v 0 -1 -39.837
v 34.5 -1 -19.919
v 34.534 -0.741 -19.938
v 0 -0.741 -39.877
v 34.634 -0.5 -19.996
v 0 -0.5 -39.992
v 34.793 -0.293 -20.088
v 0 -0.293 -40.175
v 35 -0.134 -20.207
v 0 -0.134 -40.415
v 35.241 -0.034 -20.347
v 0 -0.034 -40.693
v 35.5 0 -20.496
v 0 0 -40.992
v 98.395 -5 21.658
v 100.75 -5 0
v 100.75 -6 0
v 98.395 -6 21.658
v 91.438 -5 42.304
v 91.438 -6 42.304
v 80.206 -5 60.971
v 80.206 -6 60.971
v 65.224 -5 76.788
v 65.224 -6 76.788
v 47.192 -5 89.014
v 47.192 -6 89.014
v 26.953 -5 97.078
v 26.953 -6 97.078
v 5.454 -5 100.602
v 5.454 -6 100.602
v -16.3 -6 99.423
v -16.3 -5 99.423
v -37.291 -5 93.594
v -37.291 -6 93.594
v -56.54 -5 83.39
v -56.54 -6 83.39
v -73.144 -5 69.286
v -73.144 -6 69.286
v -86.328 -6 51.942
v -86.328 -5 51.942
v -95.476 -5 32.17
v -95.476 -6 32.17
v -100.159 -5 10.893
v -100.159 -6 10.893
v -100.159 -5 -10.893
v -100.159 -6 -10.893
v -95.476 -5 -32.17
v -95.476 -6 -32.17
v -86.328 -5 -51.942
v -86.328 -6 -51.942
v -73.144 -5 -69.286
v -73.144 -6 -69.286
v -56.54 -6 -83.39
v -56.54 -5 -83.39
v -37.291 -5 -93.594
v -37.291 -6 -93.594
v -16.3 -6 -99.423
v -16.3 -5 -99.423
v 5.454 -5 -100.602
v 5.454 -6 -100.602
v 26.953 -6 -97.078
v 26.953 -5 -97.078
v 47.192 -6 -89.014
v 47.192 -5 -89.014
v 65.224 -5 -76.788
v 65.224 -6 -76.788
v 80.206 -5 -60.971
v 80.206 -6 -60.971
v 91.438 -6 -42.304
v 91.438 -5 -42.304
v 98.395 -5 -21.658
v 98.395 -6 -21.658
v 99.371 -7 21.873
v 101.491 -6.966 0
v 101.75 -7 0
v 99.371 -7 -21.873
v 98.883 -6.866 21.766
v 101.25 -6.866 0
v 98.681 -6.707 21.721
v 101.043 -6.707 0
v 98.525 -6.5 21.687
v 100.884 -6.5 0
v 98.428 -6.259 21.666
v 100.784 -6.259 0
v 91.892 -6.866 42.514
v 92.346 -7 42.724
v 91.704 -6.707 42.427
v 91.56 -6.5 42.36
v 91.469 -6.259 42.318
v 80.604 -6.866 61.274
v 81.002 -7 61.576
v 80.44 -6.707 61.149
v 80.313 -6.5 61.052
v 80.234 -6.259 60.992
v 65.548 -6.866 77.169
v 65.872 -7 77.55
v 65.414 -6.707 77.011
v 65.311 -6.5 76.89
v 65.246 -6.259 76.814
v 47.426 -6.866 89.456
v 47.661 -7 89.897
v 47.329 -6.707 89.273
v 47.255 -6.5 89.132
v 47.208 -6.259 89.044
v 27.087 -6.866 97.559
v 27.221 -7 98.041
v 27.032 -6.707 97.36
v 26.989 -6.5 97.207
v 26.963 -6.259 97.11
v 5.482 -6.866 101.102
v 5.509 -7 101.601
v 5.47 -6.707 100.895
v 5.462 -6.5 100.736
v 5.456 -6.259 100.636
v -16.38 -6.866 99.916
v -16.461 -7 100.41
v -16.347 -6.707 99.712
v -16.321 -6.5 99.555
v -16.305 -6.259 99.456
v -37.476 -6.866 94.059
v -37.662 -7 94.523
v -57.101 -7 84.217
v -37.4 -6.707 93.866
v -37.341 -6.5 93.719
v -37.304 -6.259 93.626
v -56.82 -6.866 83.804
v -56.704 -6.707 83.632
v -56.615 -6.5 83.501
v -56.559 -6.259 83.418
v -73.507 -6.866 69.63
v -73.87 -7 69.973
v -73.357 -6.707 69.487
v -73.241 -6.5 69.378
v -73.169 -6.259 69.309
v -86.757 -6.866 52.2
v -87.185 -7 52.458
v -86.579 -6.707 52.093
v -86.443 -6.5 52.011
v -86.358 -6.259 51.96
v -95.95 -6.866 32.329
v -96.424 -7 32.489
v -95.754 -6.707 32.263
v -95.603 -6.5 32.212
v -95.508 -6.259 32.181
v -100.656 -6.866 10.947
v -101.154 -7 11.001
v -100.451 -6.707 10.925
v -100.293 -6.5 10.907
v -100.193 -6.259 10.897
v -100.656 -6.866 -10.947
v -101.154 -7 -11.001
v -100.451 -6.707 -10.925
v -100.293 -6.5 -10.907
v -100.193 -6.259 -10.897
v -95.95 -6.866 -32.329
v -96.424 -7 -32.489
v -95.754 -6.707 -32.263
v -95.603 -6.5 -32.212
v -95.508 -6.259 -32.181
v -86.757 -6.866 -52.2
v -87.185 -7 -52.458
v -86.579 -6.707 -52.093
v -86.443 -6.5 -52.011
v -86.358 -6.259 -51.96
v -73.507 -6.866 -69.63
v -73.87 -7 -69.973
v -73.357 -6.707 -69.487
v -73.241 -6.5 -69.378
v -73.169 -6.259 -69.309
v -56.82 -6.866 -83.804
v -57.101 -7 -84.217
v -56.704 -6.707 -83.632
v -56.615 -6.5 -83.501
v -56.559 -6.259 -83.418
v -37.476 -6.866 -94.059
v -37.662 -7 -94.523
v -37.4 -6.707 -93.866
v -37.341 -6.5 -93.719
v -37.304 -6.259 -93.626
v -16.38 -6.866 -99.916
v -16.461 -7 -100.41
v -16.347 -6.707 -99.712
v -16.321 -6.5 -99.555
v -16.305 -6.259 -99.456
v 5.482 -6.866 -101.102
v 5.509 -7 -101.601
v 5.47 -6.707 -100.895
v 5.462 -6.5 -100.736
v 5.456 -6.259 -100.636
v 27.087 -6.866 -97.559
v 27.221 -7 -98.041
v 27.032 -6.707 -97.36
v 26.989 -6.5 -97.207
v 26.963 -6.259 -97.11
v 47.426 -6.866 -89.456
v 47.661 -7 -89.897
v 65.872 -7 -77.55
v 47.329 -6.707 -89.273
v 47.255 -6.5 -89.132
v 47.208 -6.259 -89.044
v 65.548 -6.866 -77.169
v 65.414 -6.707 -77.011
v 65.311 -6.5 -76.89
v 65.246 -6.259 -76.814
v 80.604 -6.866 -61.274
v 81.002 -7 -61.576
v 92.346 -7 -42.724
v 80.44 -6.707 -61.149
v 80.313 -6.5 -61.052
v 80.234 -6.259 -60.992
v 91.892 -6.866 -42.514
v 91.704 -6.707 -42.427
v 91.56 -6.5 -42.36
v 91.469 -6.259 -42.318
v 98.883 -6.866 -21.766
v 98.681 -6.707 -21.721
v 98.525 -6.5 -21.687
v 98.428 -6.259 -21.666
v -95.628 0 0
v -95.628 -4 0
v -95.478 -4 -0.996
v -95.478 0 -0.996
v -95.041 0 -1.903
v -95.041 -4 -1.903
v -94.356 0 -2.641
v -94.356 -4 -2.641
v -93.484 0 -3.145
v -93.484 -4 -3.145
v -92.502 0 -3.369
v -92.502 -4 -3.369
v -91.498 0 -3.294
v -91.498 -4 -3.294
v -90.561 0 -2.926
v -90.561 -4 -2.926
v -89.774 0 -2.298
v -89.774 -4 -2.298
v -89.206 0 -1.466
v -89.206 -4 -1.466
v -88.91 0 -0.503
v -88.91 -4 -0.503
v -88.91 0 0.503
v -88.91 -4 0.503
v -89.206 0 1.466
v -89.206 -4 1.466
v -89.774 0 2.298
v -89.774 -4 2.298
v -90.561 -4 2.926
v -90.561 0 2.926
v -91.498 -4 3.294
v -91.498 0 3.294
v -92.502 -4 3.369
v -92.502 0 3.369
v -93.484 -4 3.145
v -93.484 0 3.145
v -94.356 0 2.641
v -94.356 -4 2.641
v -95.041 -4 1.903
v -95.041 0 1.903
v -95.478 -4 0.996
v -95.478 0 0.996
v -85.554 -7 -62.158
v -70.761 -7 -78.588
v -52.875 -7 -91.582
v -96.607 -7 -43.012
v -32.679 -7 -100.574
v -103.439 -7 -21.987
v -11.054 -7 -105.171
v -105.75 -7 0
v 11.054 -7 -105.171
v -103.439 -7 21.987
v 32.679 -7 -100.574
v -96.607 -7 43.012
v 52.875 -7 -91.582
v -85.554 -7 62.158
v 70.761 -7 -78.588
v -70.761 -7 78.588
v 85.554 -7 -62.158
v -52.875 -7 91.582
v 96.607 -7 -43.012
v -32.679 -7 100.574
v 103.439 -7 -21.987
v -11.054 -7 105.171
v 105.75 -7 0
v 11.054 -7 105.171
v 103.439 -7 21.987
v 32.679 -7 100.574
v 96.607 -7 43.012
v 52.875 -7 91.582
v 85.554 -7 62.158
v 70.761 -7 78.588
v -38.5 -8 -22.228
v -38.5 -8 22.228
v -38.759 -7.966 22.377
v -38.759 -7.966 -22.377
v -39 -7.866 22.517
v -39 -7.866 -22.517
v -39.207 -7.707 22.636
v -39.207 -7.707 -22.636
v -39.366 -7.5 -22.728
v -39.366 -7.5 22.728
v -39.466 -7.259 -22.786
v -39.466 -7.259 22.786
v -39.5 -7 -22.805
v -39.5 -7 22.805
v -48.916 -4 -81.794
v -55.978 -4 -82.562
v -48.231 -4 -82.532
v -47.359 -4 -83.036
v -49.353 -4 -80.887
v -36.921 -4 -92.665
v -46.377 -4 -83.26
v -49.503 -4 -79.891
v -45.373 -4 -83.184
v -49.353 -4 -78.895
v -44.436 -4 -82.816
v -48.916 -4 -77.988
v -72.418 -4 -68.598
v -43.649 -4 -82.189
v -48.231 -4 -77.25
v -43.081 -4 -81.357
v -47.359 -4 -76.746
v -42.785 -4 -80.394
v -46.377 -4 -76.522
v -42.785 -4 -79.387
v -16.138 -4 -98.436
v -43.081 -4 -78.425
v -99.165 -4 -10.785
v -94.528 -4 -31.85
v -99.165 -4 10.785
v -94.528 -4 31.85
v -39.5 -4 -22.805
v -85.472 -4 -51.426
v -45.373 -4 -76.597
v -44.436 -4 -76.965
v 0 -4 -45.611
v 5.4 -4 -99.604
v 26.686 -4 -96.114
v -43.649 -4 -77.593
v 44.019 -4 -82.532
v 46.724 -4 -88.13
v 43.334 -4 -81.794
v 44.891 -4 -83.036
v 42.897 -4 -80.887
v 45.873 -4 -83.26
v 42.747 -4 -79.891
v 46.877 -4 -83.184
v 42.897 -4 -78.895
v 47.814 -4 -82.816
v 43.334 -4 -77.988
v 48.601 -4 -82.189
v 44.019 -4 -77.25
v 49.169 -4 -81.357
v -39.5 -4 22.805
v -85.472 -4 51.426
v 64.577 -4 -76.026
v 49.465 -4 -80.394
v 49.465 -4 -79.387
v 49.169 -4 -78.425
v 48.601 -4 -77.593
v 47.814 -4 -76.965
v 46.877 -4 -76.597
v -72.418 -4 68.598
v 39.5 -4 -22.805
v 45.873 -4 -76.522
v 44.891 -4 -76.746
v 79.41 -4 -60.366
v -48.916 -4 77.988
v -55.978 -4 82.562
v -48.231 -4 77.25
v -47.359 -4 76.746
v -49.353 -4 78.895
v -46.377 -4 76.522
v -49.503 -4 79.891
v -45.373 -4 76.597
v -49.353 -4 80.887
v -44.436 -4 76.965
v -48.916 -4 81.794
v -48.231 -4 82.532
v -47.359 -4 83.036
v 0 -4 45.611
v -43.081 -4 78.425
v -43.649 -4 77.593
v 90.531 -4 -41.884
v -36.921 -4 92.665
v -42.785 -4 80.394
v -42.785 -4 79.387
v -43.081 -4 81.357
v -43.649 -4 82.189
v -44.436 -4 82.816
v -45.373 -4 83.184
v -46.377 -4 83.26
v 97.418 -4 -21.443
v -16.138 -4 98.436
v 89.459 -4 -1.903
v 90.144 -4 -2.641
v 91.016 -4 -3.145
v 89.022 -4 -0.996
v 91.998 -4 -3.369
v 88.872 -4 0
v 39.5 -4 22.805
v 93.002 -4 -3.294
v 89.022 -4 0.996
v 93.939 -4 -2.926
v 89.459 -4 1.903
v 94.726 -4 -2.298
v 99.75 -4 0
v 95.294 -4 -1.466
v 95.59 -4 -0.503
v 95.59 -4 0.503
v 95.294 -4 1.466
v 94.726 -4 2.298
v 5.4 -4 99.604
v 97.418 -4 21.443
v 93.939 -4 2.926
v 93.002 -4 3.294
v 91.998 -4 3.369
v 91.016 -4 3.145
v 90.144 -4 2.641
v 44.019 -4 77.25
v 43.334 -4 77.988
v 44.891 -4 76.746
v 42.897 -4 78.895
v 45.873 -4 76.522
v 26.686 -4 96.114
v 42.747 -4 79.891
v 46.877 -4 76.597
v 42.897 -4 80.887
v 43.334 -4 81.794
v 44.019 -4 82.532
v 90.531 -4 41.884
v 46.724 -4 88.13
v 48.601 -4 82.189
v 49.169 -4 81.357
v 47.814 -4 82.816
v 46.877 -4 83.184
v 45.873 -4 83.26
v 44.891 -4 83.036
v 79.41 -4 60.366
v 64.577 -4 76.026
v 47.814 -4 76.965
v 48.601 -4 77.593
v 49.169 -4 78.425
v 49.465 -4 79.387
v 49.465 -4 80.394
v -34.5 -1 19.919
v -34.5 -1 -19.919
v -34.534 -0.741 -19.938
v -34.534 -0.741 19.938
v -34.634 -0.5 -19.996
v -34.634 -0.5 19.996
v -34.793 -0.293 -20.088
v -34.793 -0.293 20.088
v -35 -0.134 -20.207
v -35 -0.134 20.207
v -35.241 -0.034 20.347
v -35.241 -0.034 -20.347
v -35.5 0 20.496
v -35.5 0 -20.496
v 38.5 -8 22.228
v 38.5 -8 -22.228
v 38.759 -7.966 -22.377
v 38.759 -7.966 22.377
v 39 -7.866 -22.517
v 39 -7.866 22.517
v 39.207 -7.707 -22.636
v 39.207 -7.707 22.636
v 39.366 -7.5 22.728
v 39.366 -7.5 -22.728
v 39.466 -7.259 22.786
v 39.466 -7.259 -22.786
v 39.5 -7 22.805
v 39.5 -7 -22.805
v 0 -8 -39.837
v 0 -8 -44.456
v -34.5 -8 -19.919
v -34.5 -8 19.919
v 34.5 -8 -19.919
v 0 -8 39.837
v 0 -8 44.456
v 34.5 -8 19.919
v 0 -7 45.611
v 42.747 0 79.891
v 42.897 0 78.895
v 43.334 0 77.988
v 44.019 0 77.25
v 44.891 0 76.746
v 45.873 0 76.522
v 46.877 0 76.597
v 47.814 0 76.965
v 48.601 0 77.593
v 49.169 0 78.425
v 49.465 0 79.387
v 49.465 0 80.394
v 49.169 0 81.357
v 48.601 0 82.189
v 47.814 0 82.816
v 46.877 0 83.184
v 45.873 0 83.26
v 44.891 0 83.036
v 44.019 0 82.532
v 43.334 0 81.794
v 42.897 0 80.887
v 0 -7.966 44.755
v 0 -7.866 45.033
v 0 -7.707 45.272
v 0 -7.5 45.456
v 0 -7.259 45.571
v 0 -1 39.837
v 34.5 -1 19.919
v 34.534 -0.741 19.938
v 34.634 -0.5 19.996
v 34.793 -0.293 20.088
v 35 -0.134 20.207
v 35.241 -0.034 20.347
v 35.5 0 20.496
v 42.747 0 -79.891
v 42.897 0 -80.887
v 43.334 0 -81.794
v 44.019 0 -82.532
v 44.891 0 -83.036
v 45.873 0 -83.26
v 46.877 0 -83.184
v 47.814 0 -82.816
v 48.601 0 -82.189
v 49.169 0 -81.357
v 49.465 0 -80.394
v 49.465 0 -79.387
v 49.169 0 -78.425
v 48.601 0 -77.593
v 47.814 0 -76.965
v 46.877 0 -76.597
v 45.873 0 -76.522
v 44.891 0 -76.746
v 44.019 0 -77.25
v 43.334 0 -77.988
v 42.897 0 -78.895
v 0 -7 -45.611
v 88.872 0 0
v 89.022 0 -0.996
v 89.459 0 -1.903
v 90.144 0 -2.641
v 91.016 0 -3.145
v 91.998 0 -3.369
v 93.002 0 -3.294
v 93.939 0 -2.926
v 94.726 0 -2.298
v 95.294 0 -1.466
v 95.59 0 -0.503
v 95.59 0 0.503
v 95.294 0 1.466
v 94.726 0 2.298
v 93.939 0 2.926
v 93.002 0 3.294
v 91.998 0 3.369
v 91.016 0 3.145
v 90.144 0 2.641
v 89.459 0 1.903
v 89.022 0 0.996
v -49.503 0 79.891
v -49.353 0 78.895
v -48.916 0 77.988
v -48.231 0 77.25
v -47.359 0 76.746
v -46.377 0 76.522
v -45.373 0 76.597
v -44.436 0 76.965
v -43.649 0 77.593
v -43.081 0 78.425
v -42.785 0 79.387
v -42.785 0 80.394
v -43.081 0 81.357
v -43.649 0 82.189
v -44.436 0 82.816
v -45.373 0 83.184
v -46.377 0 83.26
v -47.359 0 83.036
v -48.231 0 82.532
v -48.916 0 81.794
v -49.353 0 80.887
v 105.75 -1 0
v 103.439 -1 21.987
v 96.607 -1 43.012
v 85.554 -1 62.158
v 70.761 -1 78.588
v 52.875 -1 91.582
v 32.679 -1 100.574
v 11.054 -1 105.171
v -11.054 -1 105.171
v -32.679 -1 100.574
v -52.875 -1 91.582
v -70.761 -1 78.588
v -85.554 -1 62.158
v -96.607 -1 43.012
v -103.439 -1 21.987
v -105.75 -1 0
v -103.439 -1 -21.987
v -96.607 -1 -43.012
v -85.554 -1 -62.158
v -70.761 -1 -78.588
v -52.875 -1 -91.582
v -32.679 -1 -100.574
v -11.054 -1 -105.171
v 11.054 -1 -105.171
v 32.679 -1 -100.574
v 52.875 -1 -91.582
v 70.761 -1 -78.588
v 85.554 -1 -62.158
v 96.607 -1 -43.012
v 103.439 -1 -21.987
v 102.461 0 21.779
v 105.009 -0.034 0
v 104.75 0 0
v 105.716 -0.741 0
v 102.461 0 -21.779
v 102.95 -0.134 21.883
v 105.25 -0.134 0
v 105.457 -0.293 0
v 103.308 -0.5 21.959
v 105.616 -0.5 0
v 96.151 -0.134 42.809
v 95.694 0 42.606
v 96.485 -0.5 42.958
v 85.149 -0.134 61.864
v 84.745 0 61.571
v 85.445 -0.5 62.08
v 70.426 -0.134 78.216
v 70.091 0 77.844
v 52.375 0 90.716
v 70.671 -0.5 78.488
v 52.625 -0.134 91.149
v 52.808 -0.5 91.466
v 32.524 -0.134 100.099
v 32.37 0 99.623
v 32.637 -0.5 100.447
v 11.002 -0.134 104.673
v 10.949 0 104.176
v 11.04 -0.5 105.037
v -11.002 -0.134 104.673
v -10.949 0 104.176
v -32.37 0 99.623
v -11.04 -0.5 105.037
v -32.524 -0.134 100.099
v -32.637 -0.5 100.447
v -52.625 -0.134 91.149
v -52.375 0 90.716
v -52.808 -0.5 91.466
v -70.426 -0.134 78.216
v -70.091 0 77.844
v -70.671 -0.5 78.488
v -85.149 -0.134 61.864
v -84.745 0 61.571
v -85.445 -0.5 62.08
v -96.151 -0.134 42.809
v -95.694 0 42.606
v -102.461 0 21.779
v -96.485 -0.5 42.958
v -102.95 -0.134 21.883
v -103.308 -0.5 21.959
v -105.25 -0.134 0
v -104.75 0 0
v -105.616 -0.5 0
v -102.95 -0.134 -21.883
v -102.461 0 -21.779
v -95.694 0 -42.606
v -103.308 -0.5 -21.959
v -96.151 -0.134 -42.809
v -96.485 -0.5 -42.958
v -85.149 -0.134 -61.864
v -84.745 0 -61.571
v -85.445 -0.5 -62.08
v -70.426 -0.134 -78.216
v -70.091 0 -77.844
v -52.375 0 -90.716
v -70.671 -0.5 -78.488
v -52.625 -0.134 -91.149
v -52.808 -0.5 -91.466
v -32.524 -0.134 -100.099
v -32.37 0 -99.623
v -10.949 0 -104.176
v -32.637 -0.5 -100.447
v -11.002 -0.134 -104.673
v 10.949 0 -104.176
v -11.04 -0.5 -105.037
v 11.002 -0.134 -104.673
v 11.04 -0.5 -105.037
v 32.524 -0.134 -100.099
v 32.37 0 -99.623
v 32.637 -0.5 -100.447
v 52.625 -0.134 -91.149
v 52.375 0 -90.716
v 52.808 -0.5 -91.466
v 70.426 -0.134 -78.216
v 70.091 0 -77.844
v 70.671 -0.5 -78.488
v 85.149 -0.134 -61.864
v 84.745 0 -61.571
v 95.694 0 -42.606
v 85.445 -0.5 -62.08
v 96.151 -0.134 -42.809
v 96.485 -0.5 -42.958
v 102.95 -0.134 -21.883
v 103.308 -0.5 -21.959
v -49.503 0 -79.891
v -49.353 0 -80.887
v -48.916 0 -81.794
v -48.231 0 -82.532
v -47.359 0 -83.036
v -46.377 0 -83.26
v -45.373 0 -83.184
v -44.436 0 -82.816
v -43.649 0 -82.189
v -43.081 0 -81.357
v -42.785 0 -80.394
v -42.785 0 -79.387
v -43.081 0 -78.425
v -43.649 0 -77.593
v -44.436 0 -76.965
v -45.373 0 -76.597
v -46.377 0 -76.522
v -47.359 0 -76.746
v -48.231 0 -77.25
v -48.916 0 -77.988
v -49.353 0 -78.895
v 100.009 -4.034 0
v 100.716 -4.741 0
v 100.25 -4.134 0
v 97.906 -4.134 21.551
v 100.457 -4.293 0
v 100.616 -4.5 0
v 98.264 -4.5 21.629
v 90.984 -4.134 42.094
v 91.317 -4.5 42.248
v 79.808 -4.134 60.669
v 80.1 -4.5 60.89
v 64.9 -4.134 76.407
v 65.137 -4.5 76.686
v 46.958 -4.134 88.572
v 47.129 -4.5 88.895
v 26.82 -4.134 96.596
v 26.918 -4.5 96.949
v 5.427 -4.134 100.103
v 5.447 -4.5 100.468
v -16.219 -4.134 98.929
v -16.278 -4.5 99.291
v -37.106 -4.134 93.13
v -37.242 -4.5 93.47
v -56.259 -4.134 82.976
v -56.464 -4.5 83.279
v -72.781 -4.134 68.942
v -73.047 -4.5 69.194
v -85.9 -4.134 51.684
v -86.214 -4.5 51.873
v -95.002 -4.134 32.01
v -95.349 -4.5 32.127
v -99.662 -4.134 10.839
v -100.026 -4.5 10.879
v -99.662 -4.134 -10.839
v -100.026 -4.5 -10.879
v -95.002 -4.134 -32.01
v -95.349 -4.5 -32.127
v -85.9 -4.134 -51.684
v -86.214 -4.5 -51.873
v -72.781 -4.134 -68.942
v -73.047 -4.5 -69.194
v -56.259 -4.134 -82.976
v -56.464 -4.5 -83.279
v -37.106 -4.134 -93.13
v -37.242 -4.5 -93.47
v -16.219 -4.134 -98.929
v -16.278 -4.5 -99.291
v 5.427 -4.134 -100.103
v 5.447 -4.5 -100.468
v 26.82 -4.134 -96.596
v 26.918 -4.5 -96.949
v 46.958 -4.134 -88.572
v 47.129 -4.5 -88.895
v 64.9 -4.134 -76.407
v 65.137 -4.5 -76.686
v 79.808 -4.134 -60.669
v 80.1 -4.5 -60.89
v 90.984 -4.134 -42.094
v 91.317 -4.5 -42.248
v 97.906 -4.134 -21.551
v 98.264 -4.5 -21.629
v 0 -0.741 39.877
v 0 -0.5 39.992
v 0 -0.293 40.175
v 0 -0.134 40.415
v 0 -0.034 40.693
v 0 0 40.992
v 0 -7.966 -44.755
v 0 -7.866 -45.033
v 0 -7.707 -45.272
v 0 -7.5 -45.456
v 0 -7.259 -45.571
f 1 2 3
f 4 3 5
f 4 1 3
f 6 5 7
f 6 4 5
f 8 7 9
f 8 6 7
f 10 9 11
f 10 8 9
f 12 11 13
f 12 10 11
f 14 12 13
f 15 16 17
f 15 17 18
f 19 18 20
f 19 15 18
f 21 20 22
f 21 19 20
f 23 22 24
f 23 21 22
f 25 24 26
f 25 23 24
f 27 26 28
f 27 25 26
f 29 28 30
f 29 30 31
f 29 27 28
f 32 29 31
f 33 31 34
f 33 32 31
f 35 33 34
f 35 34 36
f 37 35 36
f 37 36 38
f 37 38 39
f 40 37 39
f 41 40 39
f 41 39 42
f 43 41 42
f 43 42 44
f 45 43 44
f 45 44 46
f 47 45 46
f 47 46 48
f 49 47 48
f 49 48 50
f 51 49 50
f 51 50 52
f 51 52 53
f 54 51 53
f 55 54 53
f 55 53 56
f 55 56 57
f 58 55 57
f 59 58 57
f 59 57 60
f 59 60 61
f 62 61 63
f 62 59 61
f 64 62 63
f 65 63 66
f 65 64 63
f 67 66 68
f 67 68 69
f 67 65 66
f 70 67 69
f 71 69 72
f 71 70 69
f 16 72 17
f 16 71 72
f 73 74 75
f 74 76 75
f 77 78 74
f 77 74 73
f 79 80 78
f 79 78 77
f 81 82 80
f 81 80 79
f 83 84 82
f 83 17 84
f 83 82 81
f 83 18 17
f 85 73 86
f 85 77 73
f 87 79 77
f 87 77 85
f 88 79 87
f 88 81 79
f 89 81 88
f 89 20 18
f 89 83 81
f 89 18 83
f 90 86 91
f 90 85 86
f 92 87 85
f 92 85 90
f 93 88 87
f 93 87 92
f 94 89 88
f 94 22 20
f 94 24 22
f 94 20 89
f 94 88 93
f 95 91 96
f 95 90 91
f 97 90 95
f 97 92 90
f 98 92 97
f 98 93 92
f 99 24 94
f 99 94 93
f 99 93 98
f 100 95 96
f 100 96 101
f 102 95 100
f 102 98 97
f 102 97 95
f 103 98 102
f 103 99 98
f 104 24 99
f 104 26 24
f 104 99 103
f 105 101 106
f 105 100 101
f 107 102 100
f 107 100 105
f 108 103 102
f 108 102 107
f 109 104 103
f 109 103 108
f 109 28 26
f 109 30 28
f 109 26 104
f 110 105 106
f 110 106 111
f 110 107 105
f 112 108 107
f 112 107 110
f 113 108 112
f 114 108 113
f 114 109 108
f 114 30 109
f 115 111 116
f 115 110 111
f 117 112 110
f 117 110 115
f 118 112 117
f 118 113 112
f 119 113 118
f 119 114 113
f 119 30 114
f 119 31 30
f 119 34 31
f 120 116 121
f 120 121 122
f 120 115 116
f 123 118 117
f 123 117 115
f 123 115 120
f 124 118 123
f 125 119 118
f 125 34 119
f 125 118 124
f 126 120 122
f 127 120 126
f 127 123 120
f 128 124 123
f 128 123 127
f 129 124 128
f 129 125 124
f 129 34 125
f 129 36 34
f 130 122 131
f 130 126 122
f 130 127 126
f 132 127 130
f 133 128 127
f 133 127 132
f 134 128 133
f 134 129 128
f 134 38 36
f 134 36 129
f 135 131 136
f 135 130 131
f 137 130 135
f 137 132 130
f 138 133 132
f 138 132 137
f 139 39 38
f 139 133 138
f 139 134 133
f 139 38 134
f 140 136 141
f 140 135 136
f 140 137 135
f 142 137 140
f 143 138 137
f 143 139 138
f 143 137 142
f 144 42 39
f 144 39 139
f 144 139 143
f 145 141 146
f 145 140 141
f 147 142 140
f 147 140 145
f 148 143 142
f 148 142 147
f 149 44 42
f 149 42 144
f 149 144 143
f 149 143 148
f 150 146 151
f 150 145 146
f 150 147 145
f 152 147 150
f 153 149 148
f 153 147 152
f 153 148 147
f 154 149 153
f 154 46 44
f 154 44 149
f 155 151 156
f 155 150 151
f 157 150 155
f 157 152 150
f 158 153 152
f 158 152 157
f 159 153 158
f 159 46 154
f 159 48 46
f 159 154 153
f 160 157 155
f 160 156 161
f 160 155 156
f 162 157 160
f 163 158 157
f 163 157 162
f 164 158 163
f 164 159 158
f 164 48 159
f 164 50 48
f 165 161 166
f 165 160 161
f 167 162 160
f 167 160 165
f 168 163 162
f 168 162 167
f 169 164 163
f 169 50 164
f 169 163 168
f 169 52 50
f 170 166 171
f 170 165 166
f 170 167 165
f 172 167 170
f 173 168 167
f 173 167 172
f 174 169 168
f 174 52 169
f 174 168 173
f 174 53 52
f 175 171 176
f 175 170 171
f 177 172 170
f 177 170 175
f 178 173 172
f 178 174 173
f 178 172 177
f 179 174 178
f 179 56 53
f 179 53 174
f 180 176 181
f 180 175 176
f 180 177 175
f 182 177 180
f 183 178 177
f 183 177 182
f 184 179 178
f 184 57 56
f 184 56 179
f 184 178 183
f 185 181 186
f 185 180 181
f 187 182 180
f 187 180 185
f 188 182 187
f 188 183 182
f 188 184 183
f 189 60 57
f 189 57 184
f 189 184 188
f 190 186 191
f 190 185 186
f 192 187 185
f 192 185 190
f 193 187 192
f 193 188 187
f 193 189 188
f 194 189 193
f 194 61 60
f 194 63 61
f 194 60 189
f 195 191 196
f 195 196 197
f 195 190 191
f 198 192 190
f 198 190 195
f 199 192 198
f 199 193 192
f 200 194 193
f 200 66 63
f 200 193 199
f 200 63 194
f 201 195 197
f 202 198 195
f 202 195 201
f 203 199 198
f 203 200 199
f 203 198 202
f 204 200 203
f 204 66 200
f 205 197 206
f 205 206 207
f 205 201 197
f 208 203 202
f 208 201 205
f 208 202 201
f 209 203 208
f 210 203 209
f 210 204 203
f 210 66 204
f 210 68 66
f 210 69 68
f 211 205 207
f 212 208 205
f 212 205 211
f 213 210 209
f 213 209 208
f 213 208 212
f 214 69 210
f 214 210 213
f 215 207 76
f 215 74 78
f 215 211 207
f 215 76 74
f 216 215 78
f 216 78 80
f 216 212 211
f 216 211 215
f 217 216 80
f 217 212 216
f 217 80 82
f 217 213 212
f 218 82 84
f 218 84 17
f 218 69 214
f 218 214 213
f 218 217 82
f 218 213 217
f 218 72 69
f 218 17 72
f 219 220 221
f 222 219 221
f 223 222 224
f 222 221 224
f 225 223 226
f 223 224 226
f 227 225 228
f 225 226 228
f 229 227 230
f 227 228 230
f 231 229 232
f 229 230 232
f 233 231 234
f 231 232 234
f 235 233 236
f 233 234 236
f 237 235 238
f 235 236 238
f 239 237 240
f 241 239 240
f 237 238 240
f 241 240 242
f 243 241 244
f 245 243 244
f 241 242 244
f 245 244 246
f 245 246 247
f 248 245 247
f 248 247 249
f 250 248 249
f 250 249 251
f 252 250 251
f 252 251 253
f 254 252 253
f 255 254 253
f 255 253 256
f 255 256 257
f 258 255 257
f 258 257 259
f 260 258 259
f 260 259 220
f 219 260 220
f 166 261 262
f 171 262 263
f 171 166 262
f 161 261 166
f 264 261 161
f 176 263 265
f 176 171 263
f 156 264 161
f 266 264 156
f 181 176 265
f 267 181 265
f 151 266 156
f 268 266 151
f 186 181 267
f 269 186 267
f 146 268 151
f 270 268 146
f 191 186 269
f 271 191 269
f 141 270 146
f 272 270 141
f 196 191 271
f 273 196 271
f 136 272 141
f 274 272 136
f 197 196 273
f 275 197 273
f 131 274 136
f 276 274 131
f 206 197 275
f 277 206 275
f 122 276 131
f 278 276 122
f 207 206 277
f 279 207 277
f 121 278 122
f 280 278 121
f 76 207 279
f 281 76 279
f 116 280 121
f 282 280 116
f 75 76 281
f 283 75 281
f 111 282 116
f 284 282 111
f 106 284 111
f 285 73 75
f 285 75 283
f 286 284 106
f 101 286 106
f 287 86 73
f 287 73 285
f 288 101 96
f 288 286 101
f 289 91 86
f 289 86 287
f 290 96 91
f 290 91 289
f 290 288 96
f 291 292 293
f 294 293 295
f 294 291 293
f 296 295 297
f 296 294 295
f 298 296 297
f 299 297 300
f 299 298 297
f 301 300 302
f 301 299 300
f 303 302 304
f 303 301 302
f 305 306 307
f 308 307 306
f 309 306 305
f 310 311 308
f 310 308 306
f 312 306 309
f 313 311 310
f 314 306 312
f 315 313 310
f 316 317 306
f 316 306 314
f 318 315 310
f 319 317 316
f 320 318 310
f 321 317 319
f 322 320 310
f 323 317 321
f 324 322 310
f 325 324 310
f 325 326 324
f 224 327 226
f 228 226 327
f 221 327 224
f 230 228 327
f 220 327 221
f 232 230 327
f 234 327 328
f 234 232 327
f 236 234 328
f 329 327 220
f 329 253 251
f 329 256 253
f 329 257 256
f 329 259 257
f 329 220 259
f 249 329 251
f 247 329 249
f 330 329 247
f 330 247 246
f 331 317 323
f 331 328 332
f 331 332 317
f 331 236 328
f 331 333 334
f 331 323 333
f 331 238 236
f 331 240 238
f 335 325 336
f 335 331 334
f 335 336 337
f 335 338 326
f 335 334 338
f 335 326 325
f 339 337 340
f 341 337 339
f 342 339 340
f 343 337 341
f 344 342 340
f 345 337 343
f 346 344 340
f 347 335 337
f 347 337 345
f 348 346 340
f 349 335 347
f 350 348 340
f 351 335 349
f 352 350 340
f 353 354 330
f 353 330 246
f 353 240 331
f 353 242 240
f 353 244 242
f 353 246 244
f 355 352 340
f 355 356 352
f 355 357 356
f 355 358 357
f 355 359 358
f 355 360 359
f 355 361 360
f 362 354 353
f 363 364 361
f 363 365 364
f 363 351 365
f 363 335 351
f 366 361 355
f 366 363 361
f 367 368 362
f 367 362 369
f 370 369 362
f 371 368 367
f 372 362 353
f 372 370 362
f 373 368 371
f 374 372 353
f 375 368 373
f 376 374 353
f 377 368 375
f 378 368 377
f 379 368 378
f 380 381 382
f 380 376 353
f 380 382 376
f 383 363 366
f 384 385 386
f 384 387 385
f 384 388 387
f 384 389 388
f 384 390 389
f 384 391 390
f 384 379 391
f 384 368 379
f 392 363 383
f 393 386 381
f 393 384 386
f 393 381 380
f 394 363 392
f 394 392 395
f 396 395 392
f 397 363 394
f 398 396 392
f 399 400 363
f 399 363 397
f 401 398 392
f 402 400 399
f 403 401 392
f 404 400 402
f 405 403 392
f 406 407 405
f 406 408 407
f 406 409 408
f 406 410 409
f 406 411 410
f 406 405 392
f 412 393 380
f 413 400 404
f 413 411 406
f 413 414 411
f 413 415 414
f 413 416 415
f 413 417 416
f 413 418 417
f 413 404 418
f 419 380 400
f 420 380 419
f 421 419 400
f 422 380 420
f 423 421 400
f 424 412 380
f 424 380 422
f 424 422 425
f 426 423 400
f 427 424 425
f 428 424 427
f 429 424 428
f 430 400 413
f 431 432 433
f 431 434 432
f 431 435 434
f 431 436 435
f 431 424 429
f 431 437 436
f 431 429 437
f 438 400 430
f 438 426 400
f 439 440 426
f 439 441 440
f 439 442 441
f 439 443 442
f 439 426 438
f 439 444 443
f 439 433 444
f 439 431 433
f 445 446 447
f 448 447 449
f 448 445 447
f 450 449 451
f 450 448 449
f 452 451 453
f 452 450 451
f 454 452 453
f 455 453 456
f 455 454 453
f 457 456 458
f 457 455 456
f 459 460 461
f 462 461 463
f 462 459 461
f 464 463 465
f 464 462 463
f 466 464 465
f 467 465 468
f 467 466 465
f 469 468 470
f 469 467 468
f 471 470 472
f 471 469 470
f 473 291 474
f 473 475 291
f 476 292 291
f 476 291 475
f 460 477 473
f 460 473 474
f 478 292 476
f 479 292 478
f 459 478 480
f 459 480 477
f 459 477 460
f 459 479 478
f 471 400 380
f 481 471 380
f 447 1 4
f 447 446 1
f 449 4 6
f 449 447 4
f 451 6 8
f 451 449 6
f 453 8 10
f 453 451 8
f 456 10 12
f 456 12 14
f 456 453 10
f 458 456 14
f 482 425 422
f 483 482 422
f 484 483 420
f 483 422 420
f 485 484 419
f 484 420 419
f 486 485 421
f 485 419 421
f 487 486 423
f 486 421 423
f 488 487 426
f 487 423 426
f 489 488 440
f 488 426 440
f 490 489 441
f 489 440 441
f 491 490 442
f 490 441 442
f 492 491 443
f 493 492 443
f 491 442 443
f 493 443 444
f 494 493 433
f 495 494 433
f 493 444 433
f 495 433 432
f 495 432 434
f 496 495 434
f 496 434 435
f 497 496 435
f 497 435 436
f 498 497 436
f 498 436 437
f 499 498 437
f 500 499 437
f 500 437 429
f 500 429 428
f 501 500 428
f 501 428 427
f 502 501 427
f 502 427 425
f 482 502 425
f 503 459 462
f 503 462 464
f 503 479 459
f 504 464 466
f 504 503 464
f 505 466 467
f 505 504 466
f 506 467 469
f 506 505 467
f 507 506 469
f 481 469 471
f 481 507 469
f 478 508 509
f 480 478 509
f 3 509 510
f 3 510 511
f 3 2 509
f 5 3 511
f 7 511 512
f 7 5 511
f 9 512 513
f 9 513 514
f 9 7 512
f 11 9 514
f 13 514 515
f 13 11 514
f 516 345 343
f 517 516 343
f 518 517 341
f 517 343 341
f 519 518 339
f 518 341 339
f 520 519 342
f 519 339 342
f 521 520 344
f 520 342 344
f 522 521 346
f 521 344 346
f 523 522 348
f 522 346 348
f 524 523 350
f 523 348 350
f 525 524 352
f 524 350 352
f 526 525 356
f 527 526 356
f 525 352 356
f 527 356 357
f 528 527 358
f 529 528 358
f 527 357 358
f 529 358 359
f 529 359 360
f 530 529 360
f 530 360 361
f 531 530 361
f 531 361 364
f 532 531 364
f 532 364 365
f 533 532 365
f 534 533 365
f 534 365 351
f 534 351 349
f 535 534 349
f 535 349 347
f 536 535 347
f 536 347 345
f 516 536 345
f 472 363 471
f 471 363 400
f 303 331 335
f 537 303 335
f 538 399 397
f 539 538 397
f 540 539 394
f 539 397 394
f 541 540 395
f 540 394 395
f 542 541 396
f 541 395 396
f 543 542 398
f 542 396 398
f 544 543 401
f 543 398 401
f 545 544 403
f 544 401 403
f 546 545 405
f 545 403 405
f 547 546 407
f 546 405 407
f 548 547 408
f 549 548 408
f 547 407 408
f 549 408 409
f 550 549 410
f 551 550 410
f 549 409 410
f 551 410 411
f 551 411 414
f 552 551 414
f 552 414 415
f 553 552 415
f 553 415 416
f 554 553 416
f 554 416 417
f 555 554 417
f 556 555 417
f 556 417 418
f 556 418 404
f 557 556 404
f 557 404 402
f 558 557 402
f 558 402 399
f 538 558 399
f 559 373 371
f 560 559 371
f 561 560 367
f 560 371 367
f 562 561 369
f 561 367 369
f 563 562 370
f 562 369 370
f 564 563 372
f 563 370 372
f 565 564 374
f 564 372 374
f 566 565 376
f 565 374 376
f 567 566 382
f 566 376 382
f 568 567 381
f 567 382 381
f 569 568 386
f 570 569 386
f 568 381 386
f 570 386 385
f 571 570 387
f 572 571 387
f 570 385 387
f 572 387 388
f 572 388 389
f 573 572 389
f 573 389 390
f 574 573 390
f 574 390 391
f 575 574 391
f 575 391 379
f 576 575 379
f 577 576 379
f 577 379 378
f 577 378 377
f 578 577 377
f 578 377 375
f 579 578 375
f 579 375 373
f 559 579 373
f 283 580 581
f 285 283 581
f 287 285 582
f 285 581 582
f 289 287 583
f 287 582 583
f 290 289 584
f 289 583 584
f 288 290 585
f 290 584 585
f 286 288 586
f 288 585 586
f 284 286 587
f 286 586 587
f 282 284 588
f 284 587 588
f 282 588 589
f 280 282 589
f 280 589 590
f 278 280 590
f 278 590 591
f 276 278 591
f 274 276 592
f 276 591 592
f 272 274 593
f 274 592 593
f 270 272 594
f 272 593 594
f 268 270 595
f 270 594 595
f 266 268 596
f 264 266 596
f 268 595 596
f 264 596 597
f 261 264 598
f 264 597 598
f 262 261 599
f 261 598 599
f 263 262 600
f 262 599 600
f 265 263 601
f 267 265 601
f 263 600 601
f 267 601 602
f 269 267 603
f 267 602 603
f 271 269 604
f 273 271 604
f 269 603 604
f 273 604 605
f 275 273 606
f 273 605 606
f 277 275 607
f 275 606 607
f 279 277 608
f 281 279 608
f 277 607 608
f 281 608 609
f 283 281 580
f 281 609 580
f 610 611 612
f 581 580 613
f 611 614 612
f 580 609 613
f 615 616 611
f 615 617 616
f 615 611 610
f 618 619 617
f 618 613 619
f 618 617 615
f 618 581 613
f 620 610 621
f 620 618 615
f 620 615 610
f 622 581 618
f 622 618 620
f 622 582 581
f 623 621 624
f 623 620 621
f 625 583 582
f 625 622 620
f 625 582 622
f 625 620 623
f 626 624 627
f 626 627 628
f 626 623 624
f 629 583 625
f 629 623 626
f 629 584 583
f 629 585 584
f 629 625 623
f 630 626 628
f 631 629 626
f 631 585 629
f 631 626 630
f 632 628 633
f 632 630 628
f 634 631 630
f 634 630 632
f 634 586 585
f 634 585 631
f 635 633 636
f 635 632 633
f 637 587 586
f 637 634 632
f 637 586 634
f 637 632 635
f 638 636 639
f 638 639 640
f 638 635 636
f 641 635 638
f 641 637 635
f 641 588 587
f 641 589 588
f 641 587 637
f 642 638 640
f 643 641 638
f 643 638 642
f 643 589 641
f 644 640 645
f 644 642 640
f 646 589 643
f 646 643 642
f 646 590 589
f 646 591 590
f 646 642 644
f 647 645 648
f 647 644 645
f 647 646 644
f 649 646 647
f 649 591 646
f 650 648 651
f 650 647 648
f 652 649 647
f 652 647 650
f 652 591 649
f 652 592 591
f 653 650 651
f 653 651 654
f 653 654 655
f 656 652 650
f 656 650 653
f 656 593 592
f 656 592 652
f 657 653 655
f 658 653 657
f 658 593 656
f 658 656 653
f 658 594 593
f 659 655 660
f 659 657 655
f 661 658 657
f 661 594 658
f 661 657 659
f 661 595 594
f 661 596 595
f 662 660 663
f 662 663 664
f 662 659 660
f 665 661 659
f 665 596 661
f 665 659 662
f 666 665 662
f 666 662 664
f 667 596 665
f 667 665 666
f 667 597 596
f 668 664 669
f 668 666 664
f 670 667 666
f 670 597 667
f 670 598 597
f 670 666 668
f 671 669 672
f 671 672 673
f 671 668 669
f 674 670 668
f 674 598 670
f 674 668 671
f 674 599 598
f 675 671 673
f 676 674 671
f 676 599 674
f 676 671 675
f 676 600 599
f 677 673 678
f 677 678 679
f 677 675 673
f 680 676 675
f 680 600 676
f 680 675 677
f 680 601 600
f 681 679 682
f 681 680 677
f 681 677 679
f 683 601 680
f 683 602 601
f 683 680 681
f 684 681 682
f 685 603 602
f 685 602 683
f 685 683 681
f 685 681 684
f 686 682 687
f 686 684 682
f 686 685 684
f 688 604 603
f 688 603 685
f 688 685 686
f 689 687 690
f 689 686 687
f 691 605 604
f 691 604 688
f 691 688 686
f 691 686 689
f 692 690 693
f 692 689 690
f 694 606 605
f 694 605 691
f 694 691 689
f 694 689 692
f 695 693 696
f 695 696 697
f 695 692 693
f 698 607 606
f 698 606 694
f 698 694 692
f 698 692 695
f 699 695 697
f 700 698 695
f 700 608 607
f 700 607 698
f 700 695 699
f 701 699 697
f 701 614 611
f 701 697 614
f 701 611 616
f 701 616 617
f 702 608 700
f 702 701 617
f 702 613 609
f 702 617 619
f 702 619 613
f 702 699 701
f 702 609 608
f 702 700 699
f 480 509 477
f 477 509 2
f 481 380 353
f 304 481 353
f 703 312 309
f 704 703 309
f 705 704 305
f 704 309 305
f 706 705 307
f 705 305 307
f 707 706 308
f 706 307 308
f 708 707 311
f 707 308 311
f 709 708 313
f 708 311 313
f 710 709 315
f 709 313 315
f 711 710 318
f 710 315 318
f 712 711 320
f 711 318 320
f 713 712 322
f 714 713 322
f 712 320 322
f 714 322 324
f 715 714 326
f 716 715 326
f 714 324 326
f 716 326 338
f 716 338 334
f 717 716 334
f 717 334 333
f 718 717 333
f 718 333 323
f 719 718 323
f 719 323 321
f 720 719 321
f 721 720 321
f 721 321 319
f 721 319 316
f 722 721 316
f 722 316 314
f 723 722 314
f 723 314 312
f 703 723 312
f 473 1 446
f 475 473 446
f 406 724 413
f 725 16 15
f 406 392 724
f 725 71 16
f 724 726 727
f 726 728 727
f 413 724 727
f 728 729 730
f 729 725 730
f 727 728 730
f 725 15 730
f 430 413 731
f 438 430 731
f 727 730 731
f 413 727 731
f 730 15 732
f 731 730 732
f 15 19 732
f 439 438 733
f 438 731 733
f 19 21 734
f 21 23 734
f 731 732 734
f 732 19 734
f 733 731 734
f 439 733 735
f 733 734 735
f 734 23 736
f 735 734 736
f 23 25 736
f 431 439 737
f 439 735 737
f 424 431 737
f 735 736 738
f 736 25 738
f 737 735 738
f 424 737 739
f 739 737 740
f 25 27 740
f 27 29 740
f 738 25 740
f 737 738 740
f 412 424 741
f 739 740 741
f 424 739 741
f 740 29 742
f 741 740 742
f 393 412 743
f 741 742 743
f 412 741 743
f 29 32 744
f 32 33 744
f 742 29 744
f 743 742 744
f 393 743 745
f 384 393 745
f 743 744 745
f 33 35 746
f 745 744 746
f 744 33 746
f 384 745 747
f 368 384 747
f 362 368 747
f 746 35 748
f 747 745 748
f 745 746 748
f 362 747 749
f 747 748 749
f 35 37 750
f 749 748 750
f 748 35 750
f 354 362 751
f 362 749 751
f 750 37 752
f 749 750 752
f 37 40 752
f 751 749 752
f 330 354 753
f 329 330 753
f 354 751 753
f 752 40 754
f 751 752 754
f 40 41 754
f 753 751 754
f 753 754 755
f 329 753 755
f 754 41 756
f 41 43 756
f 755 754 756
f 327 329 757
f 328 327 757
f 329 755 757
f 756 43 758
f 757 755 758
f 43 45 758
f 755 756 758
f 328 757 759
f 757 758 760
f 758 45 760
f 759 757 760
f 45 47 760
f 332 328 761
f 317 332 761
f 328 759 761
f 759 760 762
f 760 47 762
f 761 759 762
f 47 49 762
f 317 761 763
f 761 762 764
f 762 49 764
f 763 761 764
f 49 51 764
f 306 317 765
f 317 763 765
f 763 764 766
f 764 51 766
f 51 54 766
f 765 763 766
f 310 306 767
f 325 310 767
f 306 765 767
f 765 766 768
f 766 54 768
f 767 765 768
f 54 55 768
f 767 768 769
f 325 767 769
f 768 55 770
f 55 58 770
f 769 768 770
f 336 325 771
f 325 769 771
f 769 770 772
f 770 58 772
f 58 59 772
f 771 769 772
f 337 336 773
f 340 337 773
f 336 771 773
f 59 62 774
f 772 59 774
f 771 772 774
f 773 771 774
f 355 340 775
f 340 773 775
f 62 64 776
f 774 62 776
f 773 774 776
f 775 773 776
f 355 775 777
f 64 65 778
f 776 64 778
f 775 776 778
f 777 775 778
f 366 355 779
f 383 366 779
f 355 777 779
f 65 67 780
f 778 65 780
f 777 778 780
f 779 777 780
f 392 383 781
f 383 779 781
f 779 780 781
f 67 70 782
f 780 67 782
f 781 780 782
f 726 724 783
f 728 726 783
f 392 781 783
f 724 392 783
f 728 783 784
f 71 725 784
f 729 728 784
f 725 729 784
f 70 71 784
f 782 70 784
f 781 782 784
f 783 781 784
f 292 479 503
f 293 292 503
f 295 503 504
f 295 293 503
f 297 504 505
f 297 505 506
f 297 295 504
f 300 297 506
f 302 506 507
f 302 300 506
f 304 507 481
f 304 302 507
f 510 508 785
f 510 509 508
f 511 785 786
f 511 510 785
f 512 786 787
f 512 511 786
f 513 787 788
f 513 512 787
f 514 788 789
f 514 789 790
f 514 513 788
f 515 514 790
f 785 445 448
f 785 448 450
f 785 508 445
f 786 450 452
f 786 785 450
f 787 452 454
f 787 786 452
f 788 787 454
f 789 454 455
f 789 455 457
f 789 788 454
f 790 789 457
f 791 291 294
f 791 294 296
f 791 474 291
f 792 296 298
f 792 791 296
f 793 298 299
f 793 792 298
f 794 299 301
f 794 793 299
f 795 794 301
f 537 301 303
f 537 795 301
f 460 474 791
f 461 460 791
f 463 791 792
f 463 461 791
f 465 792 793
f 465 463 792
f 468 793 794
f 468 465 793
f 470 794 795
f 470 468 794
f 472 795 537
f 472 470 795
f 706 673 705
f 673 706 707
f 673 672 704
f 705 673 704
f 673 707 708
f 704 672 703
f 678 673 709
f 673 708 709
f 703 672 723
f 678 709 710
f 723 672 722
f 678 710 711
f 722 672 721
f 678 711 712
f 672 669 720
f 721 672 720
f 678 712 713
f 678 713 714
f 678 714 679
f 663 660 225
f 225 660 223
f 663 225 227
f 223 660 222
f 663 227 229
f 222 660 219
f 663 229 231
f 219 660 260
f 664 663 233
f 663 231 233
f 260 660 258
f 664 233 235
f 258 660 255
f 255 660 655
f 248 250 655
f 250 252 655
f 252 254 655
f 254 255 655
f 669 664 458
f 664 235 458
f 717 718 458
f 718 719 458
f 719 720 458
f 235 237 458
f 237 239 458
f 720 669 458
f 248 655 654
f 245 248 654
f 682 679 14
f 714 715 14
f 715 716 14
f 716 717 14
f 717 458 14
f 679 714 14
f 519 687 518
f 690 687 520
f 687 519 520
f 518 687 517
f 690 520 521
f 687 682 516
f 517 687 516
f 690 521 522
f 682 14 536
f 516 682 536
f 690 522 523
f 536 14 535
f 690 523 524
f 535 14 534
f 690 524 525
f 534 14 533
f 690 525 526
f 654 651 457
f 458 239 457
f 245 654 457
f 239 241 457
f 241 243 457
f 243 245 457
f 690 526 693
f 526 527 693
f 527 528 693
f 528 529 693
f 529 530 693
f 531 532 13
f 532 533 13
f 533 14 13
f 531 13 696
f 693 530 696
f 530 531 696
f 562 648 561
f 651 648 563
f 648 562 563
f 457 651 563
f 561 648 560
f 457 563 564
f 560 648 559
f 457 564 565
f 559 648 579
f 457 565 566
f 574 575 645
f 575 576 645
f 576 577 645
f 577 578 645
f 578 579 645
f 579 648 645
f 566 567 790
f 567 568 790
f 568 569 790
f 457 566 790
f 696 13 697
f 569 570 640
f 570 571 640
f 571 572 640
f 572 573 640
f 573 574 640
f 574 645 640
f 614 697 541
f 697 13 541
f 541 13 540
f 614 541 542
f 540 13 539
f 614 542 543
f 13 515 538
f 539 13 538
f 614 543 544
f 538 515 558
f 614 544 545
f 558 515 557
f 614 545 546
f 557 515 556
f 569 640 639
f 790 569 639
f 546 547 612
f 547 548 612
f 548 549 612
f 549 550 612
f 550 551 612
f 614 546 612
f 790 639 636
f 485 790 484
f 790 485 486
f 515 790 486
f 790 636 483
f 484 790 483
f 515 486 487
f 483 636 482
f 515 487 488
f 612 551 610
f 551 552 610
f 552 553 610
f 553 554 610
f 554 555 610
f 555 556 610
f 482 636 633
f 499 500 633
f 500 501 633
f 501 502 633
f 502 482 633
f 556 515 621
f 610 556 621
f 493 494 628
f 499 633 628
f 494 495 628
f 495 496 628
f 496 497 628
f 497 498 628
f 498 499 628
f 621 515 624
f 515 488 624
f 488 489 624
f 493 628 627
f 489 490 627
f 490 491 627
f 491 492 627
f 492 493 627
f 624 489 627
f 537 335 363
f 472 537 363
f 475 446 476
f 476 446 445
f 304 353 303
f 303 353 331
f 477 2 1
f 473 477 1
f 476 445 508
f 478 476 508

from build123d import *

# Parameters (mm, degrees)
F0_R     = 100.75
F1_DEPTH = 4
F2_DEPTH = 4
F3_DEPTH = 8
F0_R_2   = 105.75
F4_DEPTH = 7
F6_R     = 1
F7_R     = 1
F8_D     = 6.7564
F9_R     = 1


with BuildPart() as f1:
    # F0 (on Front) → F1 (new body)
    with BuildSketch(Plane.XZ):
        Circle(F0_R)
        Polygon((80.5, 46.4766966698), (80.5, -46.4766966698), (0, -92.9533933395), (-80.5, -46.4766966698), (-80.5, 46.4766966698), (0, 92.9533933395), align=None, mode=Mode.SUBTRACT)
    extrude(amount=F1_DEPTH)

    # F0 (on Front) → F4 (join)
    with BuildSketch(Plane.XZ):
        Circle(F0_R_2)
        Circle(F0_R, mode=Mode.SUBTRACT)
    extrude(amount=F4_DEPTH)


with BuildPart() as f1b:
    # F0 (on Front) → F1, piece 2 (new body)
    with BuildSketch(Plane.XZ):
        Polygon((77.5, -44.7446458622), (77.5, 44.7446458622), (0, 89.4892917244), (-77.5, 44.7446458622), (-77.5, -44.7446458622), (0, -89.4892917244), align=None)
        Polygon((39.5, 22.805335633), (39.5, -22.805335633), (0, -45.610671266), (-39.5, -22.805335633), (-39.5, 22.805335633), (0, 45.610671266), align=None, mode=Mode.SUBTRACT)
    extrude(amount=F1_DEPTH)

    # F0 (on Front) → F3 (join)
    with BuildSketch(Plane.XZ):
        Polygon((0, -45.610671266), (39.5, -22.805335633), (39.5, 22.805335633), (0, 45.610671266), (-39.5, 22.805335633), (-39.5, -22.805335633), align=None)
        Polygon((34.5, 19.918584287), (34.5, -19.918584287), (0, -39.8371685741), (-34.5, -19.918584287), (-34.5, 19.918584287), (0, 39.8371685741), align=None, mode=Mode.SUBTRACT)
    extrude(amount=F3_DEPTH)


with BuildPart() as f2:
    # F0 (on Front) → F2 (new body)
    with BuildSketch(Plane.XZ):
        Polygon((0, -92.9533933395), (80.5, -46.4766966698), (80.5, 46.4766966698), (0, 92.9533933395), (-80.5, 46.4766966698), (-80.5, -46.4766966698), align=None)
        Polygon((0, 89.4892917244), (77.5, 44.7446458622), (77.5, -44.7446458622), (0, -89.4892917244), (-77.5, -44.7446458622), (-77.5, 44.7446458622), align=None, mode=Mode.SUBTRACT)
    extrude(amount=F2_DEPTH)


with BuildPart() as f1_1:
    add(f1.part)

    # F5: union F1b, F2
    add(f1b.part)
    add(f2.part)

    # F6
    f6_edges = [f1_1.edges().sort_by_distance(p)[0] for p in [
        (19.75, -8, 34.208003),
        (39.5, -8, 0),
        (19.75, -8, -34.208003),
        (-19.75, -8, -34.208003),
        (-39.5, -8, 0),
        (-19.75, -8, 34.208003),
    ]]
    fillet(f6_edges, radius=F6_R)

    # F7
    f7_edges = [f1_1.edges().sort_by_distance(p)[0] for p in [
        (-100.75, -4, 0),
        (-105.75, 0, 0),
        (-17.25, 0, 29.877876),
        (17.25, 0, 29.877876),
        (34.5, 0, 0),
        (17.25, 0, -29.877876),
        (-17.25, 0, -29.877876),
        (-34.5, 0, 0),
    ]]
    fillet(f7_edges, radius=F7_R)

    # F8 (through all)
    with Locations(Plane(origin=(0, 0, 0), x_dir=(1, 0, 0), z_dir=(0, 1, 0))):
        with Locations((-46.125, -79.8908434991), (46.125, -79.8908434991), (92.25, 0), (46.125, 79.8908434991), (-46.125, 79.8908434991), (-92.25, 0)):
            Hole(F8_D / 2)

    # F9
    f9_edges = [f1_1.edges().sort_by_distance(p)[0] for p in [
        (-100.75, -7, 0),
    ]]
    fillet(f9_edges, radius=F9_R)


solid = f1_1.part
